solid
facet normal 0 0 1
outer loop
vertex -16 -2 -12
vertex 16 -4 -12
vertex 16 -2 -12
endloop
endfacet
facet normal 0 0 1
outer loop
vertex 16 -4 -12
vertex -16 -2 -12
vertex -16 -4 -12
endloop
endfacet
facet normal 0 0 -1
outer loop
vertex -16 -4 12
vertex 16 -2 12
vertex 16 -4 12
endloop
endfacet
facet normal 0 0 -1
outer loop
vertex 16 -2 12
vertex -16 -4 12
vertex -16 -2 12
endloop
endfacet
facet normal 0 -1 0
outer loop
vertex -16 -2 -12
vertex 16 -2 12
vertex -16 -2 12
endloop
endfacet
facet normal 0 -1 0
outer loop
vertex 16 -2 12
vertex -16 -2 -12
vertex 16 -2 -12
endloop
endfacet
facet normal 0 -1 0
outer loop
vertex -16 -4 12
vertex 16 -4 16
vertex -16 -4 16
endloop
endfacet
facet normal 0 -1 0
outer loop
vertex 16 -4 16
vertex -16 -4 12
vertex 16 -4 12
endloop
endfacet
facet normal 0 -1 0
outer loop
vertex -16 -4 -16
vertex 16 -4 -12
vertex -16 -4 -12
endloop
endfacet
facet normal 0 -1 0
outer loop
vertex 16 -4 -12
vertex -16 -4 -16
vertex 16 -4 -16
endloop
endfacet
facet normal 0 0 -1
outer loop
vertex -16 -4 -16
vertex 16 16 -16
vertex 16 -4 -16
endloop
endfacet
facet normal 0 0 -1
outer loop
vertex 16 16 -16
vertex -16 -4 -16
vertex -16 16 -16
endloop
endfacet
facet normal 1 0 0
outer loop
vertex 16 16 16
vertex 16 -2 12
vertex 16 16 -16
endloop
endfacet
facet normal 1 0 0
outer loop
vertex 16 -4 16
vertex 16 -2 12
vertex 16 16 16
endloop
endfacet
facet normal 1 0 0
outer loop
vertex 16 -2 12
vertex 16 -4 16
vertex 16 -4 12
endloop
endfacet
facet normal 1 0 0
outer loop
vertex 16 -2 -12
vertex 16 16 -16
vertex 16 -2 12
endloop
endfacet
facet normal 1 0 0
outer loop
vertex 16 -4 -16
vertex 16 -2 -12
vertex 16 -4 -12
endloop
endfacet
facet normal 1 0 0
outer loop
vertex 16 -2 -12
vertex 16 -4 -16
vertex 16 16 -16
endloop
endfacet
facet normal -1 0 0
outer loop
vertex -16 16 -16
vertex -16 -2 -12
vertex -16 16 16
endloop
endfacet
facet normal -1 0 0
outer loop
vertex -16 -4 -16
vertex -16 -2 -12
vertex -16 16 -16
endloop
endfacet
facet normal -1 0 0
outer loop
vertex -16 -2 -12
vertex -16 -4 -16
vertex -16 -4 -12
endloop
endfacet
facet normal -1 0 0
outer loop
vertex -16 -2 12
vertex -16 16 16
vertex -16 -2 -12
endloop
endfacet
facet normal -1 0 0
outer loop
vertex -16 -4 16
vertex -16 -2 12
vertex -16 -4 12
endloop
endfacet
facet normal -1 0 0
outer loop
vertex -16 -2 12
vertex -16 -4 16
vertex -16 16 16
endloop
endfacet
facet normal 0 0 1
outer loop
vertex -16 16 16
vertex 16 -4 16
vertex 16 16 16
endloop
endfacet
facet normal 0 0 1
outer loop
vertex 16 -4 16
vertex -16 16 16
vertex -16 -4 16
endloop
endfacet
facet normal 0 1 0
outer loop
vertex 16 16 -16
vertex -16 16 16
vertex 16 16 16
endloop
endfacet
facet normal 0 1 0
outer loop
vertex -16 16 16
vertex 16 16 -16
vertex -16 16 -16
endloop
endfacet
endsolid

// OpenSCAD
size = 32;//block=32 //item=8


rotate([0, 90, 0]) {
  //cube([size*0.8,size*0.8,size*0.8],center=true);
  difference() {
    cube([size * 1, size * 1, size * 1], center = true);

    union() {
      translate([0, -size * 0.125, 0]) {
        cube([size * 0.75, size * 0.125, size * 1 * 2], center = true);//front
      }
      ;//translate
      translate([0, -size * 0.375, 0]) {
        cube([size * 1 * 2, size * 0.5, size * 1 * 2], center = true);//front
      }
      ;//translate
    }
    ;//union

  }
  ;
}
;//rotate
